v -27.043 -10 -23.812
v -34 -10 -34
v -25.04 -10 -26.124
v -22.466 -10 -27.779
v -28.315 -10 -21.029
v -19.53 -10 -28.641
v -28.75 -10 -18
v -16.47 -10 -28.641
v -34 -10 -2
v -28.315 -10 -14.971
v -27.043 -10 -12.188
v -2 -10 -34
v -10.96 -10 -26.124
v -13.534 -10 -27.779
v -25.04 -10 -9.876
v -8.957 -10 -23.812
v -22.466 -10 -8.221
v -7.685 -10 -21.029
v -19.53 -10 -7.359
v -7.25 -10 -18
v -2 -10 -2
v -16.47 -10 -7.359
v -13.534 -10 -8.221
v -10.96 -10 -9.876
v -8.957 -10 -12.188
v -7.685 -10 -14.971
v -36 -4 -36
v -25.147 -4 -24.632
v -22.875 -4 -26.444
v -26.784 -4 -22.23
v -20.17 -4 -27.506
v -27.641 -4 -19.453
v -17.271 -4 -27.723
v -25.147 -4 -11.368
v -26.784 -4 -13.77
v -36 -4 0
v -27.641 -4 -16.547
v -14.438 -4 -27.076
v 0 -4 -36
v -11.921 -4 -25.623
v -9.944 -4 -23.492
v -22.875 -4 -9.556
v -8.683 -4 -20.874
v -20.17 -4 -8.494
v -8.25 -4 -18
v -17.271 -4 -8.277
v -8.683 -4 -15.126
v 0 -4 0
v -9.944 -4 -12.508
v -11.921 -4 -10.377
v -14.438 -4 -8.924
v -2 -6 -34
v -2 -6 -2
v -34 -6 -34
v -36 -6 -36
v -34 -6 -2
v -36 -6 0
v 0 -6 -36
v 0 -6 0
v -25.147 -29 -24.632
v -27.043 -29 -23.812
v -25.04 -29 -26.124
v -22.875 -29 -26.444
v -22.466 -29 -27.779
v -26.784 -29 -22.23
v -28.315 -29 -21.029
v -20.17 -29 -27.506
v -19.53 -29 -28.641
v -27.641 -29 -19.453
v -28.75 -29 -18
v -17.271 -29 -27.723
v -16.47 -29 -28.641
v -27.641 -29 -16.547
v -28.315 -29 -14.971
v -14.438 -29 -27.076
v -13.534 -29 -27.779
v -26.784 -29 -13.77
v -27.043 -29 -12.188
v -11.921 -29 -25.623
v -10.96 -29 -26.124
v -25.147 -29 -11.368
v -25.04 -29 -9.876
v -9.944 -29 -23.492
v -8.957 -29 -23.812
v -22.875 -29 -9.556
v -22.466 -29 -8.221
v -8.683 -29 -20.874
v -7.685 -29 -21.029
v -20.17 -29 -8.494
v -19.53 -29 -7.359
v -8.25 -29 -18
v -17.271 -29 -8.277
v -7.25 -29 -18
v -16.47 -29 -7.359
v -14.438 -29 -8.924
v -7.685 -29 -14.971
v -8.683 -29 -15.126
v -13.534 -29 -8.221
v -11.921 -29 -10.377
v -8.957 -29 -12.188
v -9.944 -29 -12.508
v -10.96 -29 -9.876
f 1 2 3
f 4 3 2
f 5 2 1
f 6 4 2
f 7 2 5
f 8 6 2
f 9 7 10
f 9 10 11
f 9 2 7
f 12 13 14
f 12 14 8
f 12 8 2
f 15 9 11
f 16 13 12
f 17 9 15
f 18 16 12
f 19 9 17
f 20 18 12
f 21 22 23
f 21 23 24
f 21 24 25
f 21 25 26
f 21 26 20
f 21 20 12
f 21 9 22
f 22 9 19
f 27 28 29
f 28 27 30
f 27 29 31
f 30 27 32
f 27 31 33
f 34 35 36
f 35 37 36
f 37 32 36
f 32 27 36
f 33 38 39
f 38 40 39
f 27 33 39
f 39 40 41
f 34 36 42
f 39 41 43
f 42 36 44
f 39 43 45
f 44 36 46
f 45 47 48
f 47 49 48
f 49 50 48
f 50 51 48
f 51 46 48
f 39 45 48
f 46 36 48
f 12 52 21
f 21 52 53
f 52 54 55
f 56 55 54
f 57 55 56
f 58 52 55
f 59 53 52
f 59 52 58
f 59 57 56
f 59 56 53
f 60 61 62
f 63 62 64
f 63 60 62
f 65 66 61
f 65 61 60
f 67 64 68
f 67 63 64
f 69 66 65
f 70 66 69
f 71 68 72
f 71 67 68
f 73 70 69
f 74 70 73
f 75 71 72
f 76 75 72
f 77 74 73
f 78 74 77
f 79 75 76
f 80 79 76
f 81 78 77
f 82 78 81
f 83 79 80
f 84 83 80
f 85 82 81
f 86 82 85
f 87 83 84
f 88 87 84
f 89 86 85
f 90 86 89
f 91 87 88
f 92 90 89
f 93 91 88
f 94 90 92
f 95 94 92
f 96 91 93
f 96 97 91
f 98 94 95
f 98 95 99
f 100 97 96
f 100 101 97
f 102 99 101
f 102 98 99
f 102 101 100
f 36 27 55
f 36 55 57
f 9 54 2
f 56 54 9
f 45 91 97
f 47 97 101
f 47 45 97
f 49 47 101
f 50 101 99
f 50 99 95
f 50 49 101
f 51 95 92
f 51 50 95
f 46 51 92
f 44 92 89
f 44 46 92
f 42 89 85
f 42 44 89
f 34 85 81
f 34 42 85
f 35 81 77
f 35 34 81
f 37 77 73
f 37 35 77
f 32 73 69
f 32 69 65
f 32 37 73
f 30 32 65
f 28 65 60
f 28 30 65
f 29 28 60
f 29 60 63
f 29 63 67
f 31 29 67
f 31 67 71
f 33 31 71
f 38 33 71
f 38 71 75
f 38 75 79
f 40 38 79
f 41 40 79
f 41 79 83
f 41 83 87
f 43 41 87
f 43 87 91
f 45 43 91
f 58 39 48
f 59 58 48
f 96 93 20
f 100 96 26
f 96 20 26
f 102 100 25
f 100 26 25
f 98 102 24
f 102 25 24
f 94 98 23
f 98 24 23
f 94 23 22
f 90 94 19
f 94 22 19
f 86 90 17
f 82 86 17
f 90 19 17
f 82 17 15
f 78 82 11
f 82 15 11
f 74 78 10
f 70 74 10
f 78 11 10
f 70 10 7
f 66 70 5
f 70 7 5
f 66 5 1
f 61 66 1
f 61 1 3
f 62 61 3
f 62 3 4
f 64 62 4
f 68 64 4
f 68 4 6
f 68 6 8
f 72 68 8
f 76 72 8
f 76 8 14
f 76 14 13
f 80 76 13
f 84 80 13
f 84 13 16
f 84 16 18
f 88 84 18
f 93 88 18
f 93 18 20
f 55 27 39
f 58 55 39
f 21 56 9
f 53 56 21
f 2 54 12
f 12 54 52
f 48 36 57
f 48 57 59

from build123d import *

# Parameters (mm, degrees)
SKETCH016_W      = 32
SKETCH016_H      = 32
SKETCH016_R      = 9.75
EXTRUDE015_DEPTH = 6
SKETCH017_R      = 10.75
SKETCH017_R_2    = 9.75
EXTRUDE016_DEPTH = 25
SKETCH014_W      = 36
SKETCH014_H      = 36
SKETCH014_W_2    = 28
SKETCH014_H_2    = 28
EXTRUDE013_DEPTH = 2


with BuildPart() as extrude015:
    # Sketch016 → Extrude015 (new body)
    with BuildSketch(Plane.XZ):
        with Locations((-18, -18)):
            Rectangle(SKETCH016_W, SKETCH016_H)
        with Locations((-18, -18)):
            Circle(SKETCH016_R, mode=Mode.SUBTRACT)
    extrude(amount=EXTRUDE015_DEPTH)


with BuildPart() as extrude015_1:
    # Extrude015 placement: moved
    add(extrude015.part.moved(Location((0, -4, 0))))


with BuildPart() as extrude016:
    # Sketch017 → Extrude016 (new body)
    with BuildSketch(Plane.XZ):
        with Locations((-18, -18)):
            Circle(SKETCH017_R)
        with Locations((-18, -18)):
            Circle(SKETCH017_R_2, mode=Mode.SUBTRACT)
    extrude(amount=EXTRUDE016_DEPTH)


with BuildPart() as extrude016_1:
    # Extrude016 placement: moved
    add(extrude016.part.moved(Location((0, -4, 0))))


with BuildPart() as fusion002:
    # Sketch014 → Extrude013 (new body)
    with BuildSketch(Plane.XZ):
        with Locations((-18, -18)):
            Rectangle(SKETCH014_W, SKETCH014_H)
        with Locations((-18, -18)):
            Rectangle(SKETCH014_W_2, SKETCH014_H_2, mode=Mode.SUBTRACT)
    extrude(amount=EXTRUDE013_DEPTH)


with BuildPart() as fusion002_1:
    # Extrude013 placement: moved
    add(fusion002.part.moved(Location((0, -4, 0))))

    # Fusion002: union Extrude015, Extrude016
    add(extrude015_1.part)
    add(extrude016_1.part)


solid = fusion002_1.part
